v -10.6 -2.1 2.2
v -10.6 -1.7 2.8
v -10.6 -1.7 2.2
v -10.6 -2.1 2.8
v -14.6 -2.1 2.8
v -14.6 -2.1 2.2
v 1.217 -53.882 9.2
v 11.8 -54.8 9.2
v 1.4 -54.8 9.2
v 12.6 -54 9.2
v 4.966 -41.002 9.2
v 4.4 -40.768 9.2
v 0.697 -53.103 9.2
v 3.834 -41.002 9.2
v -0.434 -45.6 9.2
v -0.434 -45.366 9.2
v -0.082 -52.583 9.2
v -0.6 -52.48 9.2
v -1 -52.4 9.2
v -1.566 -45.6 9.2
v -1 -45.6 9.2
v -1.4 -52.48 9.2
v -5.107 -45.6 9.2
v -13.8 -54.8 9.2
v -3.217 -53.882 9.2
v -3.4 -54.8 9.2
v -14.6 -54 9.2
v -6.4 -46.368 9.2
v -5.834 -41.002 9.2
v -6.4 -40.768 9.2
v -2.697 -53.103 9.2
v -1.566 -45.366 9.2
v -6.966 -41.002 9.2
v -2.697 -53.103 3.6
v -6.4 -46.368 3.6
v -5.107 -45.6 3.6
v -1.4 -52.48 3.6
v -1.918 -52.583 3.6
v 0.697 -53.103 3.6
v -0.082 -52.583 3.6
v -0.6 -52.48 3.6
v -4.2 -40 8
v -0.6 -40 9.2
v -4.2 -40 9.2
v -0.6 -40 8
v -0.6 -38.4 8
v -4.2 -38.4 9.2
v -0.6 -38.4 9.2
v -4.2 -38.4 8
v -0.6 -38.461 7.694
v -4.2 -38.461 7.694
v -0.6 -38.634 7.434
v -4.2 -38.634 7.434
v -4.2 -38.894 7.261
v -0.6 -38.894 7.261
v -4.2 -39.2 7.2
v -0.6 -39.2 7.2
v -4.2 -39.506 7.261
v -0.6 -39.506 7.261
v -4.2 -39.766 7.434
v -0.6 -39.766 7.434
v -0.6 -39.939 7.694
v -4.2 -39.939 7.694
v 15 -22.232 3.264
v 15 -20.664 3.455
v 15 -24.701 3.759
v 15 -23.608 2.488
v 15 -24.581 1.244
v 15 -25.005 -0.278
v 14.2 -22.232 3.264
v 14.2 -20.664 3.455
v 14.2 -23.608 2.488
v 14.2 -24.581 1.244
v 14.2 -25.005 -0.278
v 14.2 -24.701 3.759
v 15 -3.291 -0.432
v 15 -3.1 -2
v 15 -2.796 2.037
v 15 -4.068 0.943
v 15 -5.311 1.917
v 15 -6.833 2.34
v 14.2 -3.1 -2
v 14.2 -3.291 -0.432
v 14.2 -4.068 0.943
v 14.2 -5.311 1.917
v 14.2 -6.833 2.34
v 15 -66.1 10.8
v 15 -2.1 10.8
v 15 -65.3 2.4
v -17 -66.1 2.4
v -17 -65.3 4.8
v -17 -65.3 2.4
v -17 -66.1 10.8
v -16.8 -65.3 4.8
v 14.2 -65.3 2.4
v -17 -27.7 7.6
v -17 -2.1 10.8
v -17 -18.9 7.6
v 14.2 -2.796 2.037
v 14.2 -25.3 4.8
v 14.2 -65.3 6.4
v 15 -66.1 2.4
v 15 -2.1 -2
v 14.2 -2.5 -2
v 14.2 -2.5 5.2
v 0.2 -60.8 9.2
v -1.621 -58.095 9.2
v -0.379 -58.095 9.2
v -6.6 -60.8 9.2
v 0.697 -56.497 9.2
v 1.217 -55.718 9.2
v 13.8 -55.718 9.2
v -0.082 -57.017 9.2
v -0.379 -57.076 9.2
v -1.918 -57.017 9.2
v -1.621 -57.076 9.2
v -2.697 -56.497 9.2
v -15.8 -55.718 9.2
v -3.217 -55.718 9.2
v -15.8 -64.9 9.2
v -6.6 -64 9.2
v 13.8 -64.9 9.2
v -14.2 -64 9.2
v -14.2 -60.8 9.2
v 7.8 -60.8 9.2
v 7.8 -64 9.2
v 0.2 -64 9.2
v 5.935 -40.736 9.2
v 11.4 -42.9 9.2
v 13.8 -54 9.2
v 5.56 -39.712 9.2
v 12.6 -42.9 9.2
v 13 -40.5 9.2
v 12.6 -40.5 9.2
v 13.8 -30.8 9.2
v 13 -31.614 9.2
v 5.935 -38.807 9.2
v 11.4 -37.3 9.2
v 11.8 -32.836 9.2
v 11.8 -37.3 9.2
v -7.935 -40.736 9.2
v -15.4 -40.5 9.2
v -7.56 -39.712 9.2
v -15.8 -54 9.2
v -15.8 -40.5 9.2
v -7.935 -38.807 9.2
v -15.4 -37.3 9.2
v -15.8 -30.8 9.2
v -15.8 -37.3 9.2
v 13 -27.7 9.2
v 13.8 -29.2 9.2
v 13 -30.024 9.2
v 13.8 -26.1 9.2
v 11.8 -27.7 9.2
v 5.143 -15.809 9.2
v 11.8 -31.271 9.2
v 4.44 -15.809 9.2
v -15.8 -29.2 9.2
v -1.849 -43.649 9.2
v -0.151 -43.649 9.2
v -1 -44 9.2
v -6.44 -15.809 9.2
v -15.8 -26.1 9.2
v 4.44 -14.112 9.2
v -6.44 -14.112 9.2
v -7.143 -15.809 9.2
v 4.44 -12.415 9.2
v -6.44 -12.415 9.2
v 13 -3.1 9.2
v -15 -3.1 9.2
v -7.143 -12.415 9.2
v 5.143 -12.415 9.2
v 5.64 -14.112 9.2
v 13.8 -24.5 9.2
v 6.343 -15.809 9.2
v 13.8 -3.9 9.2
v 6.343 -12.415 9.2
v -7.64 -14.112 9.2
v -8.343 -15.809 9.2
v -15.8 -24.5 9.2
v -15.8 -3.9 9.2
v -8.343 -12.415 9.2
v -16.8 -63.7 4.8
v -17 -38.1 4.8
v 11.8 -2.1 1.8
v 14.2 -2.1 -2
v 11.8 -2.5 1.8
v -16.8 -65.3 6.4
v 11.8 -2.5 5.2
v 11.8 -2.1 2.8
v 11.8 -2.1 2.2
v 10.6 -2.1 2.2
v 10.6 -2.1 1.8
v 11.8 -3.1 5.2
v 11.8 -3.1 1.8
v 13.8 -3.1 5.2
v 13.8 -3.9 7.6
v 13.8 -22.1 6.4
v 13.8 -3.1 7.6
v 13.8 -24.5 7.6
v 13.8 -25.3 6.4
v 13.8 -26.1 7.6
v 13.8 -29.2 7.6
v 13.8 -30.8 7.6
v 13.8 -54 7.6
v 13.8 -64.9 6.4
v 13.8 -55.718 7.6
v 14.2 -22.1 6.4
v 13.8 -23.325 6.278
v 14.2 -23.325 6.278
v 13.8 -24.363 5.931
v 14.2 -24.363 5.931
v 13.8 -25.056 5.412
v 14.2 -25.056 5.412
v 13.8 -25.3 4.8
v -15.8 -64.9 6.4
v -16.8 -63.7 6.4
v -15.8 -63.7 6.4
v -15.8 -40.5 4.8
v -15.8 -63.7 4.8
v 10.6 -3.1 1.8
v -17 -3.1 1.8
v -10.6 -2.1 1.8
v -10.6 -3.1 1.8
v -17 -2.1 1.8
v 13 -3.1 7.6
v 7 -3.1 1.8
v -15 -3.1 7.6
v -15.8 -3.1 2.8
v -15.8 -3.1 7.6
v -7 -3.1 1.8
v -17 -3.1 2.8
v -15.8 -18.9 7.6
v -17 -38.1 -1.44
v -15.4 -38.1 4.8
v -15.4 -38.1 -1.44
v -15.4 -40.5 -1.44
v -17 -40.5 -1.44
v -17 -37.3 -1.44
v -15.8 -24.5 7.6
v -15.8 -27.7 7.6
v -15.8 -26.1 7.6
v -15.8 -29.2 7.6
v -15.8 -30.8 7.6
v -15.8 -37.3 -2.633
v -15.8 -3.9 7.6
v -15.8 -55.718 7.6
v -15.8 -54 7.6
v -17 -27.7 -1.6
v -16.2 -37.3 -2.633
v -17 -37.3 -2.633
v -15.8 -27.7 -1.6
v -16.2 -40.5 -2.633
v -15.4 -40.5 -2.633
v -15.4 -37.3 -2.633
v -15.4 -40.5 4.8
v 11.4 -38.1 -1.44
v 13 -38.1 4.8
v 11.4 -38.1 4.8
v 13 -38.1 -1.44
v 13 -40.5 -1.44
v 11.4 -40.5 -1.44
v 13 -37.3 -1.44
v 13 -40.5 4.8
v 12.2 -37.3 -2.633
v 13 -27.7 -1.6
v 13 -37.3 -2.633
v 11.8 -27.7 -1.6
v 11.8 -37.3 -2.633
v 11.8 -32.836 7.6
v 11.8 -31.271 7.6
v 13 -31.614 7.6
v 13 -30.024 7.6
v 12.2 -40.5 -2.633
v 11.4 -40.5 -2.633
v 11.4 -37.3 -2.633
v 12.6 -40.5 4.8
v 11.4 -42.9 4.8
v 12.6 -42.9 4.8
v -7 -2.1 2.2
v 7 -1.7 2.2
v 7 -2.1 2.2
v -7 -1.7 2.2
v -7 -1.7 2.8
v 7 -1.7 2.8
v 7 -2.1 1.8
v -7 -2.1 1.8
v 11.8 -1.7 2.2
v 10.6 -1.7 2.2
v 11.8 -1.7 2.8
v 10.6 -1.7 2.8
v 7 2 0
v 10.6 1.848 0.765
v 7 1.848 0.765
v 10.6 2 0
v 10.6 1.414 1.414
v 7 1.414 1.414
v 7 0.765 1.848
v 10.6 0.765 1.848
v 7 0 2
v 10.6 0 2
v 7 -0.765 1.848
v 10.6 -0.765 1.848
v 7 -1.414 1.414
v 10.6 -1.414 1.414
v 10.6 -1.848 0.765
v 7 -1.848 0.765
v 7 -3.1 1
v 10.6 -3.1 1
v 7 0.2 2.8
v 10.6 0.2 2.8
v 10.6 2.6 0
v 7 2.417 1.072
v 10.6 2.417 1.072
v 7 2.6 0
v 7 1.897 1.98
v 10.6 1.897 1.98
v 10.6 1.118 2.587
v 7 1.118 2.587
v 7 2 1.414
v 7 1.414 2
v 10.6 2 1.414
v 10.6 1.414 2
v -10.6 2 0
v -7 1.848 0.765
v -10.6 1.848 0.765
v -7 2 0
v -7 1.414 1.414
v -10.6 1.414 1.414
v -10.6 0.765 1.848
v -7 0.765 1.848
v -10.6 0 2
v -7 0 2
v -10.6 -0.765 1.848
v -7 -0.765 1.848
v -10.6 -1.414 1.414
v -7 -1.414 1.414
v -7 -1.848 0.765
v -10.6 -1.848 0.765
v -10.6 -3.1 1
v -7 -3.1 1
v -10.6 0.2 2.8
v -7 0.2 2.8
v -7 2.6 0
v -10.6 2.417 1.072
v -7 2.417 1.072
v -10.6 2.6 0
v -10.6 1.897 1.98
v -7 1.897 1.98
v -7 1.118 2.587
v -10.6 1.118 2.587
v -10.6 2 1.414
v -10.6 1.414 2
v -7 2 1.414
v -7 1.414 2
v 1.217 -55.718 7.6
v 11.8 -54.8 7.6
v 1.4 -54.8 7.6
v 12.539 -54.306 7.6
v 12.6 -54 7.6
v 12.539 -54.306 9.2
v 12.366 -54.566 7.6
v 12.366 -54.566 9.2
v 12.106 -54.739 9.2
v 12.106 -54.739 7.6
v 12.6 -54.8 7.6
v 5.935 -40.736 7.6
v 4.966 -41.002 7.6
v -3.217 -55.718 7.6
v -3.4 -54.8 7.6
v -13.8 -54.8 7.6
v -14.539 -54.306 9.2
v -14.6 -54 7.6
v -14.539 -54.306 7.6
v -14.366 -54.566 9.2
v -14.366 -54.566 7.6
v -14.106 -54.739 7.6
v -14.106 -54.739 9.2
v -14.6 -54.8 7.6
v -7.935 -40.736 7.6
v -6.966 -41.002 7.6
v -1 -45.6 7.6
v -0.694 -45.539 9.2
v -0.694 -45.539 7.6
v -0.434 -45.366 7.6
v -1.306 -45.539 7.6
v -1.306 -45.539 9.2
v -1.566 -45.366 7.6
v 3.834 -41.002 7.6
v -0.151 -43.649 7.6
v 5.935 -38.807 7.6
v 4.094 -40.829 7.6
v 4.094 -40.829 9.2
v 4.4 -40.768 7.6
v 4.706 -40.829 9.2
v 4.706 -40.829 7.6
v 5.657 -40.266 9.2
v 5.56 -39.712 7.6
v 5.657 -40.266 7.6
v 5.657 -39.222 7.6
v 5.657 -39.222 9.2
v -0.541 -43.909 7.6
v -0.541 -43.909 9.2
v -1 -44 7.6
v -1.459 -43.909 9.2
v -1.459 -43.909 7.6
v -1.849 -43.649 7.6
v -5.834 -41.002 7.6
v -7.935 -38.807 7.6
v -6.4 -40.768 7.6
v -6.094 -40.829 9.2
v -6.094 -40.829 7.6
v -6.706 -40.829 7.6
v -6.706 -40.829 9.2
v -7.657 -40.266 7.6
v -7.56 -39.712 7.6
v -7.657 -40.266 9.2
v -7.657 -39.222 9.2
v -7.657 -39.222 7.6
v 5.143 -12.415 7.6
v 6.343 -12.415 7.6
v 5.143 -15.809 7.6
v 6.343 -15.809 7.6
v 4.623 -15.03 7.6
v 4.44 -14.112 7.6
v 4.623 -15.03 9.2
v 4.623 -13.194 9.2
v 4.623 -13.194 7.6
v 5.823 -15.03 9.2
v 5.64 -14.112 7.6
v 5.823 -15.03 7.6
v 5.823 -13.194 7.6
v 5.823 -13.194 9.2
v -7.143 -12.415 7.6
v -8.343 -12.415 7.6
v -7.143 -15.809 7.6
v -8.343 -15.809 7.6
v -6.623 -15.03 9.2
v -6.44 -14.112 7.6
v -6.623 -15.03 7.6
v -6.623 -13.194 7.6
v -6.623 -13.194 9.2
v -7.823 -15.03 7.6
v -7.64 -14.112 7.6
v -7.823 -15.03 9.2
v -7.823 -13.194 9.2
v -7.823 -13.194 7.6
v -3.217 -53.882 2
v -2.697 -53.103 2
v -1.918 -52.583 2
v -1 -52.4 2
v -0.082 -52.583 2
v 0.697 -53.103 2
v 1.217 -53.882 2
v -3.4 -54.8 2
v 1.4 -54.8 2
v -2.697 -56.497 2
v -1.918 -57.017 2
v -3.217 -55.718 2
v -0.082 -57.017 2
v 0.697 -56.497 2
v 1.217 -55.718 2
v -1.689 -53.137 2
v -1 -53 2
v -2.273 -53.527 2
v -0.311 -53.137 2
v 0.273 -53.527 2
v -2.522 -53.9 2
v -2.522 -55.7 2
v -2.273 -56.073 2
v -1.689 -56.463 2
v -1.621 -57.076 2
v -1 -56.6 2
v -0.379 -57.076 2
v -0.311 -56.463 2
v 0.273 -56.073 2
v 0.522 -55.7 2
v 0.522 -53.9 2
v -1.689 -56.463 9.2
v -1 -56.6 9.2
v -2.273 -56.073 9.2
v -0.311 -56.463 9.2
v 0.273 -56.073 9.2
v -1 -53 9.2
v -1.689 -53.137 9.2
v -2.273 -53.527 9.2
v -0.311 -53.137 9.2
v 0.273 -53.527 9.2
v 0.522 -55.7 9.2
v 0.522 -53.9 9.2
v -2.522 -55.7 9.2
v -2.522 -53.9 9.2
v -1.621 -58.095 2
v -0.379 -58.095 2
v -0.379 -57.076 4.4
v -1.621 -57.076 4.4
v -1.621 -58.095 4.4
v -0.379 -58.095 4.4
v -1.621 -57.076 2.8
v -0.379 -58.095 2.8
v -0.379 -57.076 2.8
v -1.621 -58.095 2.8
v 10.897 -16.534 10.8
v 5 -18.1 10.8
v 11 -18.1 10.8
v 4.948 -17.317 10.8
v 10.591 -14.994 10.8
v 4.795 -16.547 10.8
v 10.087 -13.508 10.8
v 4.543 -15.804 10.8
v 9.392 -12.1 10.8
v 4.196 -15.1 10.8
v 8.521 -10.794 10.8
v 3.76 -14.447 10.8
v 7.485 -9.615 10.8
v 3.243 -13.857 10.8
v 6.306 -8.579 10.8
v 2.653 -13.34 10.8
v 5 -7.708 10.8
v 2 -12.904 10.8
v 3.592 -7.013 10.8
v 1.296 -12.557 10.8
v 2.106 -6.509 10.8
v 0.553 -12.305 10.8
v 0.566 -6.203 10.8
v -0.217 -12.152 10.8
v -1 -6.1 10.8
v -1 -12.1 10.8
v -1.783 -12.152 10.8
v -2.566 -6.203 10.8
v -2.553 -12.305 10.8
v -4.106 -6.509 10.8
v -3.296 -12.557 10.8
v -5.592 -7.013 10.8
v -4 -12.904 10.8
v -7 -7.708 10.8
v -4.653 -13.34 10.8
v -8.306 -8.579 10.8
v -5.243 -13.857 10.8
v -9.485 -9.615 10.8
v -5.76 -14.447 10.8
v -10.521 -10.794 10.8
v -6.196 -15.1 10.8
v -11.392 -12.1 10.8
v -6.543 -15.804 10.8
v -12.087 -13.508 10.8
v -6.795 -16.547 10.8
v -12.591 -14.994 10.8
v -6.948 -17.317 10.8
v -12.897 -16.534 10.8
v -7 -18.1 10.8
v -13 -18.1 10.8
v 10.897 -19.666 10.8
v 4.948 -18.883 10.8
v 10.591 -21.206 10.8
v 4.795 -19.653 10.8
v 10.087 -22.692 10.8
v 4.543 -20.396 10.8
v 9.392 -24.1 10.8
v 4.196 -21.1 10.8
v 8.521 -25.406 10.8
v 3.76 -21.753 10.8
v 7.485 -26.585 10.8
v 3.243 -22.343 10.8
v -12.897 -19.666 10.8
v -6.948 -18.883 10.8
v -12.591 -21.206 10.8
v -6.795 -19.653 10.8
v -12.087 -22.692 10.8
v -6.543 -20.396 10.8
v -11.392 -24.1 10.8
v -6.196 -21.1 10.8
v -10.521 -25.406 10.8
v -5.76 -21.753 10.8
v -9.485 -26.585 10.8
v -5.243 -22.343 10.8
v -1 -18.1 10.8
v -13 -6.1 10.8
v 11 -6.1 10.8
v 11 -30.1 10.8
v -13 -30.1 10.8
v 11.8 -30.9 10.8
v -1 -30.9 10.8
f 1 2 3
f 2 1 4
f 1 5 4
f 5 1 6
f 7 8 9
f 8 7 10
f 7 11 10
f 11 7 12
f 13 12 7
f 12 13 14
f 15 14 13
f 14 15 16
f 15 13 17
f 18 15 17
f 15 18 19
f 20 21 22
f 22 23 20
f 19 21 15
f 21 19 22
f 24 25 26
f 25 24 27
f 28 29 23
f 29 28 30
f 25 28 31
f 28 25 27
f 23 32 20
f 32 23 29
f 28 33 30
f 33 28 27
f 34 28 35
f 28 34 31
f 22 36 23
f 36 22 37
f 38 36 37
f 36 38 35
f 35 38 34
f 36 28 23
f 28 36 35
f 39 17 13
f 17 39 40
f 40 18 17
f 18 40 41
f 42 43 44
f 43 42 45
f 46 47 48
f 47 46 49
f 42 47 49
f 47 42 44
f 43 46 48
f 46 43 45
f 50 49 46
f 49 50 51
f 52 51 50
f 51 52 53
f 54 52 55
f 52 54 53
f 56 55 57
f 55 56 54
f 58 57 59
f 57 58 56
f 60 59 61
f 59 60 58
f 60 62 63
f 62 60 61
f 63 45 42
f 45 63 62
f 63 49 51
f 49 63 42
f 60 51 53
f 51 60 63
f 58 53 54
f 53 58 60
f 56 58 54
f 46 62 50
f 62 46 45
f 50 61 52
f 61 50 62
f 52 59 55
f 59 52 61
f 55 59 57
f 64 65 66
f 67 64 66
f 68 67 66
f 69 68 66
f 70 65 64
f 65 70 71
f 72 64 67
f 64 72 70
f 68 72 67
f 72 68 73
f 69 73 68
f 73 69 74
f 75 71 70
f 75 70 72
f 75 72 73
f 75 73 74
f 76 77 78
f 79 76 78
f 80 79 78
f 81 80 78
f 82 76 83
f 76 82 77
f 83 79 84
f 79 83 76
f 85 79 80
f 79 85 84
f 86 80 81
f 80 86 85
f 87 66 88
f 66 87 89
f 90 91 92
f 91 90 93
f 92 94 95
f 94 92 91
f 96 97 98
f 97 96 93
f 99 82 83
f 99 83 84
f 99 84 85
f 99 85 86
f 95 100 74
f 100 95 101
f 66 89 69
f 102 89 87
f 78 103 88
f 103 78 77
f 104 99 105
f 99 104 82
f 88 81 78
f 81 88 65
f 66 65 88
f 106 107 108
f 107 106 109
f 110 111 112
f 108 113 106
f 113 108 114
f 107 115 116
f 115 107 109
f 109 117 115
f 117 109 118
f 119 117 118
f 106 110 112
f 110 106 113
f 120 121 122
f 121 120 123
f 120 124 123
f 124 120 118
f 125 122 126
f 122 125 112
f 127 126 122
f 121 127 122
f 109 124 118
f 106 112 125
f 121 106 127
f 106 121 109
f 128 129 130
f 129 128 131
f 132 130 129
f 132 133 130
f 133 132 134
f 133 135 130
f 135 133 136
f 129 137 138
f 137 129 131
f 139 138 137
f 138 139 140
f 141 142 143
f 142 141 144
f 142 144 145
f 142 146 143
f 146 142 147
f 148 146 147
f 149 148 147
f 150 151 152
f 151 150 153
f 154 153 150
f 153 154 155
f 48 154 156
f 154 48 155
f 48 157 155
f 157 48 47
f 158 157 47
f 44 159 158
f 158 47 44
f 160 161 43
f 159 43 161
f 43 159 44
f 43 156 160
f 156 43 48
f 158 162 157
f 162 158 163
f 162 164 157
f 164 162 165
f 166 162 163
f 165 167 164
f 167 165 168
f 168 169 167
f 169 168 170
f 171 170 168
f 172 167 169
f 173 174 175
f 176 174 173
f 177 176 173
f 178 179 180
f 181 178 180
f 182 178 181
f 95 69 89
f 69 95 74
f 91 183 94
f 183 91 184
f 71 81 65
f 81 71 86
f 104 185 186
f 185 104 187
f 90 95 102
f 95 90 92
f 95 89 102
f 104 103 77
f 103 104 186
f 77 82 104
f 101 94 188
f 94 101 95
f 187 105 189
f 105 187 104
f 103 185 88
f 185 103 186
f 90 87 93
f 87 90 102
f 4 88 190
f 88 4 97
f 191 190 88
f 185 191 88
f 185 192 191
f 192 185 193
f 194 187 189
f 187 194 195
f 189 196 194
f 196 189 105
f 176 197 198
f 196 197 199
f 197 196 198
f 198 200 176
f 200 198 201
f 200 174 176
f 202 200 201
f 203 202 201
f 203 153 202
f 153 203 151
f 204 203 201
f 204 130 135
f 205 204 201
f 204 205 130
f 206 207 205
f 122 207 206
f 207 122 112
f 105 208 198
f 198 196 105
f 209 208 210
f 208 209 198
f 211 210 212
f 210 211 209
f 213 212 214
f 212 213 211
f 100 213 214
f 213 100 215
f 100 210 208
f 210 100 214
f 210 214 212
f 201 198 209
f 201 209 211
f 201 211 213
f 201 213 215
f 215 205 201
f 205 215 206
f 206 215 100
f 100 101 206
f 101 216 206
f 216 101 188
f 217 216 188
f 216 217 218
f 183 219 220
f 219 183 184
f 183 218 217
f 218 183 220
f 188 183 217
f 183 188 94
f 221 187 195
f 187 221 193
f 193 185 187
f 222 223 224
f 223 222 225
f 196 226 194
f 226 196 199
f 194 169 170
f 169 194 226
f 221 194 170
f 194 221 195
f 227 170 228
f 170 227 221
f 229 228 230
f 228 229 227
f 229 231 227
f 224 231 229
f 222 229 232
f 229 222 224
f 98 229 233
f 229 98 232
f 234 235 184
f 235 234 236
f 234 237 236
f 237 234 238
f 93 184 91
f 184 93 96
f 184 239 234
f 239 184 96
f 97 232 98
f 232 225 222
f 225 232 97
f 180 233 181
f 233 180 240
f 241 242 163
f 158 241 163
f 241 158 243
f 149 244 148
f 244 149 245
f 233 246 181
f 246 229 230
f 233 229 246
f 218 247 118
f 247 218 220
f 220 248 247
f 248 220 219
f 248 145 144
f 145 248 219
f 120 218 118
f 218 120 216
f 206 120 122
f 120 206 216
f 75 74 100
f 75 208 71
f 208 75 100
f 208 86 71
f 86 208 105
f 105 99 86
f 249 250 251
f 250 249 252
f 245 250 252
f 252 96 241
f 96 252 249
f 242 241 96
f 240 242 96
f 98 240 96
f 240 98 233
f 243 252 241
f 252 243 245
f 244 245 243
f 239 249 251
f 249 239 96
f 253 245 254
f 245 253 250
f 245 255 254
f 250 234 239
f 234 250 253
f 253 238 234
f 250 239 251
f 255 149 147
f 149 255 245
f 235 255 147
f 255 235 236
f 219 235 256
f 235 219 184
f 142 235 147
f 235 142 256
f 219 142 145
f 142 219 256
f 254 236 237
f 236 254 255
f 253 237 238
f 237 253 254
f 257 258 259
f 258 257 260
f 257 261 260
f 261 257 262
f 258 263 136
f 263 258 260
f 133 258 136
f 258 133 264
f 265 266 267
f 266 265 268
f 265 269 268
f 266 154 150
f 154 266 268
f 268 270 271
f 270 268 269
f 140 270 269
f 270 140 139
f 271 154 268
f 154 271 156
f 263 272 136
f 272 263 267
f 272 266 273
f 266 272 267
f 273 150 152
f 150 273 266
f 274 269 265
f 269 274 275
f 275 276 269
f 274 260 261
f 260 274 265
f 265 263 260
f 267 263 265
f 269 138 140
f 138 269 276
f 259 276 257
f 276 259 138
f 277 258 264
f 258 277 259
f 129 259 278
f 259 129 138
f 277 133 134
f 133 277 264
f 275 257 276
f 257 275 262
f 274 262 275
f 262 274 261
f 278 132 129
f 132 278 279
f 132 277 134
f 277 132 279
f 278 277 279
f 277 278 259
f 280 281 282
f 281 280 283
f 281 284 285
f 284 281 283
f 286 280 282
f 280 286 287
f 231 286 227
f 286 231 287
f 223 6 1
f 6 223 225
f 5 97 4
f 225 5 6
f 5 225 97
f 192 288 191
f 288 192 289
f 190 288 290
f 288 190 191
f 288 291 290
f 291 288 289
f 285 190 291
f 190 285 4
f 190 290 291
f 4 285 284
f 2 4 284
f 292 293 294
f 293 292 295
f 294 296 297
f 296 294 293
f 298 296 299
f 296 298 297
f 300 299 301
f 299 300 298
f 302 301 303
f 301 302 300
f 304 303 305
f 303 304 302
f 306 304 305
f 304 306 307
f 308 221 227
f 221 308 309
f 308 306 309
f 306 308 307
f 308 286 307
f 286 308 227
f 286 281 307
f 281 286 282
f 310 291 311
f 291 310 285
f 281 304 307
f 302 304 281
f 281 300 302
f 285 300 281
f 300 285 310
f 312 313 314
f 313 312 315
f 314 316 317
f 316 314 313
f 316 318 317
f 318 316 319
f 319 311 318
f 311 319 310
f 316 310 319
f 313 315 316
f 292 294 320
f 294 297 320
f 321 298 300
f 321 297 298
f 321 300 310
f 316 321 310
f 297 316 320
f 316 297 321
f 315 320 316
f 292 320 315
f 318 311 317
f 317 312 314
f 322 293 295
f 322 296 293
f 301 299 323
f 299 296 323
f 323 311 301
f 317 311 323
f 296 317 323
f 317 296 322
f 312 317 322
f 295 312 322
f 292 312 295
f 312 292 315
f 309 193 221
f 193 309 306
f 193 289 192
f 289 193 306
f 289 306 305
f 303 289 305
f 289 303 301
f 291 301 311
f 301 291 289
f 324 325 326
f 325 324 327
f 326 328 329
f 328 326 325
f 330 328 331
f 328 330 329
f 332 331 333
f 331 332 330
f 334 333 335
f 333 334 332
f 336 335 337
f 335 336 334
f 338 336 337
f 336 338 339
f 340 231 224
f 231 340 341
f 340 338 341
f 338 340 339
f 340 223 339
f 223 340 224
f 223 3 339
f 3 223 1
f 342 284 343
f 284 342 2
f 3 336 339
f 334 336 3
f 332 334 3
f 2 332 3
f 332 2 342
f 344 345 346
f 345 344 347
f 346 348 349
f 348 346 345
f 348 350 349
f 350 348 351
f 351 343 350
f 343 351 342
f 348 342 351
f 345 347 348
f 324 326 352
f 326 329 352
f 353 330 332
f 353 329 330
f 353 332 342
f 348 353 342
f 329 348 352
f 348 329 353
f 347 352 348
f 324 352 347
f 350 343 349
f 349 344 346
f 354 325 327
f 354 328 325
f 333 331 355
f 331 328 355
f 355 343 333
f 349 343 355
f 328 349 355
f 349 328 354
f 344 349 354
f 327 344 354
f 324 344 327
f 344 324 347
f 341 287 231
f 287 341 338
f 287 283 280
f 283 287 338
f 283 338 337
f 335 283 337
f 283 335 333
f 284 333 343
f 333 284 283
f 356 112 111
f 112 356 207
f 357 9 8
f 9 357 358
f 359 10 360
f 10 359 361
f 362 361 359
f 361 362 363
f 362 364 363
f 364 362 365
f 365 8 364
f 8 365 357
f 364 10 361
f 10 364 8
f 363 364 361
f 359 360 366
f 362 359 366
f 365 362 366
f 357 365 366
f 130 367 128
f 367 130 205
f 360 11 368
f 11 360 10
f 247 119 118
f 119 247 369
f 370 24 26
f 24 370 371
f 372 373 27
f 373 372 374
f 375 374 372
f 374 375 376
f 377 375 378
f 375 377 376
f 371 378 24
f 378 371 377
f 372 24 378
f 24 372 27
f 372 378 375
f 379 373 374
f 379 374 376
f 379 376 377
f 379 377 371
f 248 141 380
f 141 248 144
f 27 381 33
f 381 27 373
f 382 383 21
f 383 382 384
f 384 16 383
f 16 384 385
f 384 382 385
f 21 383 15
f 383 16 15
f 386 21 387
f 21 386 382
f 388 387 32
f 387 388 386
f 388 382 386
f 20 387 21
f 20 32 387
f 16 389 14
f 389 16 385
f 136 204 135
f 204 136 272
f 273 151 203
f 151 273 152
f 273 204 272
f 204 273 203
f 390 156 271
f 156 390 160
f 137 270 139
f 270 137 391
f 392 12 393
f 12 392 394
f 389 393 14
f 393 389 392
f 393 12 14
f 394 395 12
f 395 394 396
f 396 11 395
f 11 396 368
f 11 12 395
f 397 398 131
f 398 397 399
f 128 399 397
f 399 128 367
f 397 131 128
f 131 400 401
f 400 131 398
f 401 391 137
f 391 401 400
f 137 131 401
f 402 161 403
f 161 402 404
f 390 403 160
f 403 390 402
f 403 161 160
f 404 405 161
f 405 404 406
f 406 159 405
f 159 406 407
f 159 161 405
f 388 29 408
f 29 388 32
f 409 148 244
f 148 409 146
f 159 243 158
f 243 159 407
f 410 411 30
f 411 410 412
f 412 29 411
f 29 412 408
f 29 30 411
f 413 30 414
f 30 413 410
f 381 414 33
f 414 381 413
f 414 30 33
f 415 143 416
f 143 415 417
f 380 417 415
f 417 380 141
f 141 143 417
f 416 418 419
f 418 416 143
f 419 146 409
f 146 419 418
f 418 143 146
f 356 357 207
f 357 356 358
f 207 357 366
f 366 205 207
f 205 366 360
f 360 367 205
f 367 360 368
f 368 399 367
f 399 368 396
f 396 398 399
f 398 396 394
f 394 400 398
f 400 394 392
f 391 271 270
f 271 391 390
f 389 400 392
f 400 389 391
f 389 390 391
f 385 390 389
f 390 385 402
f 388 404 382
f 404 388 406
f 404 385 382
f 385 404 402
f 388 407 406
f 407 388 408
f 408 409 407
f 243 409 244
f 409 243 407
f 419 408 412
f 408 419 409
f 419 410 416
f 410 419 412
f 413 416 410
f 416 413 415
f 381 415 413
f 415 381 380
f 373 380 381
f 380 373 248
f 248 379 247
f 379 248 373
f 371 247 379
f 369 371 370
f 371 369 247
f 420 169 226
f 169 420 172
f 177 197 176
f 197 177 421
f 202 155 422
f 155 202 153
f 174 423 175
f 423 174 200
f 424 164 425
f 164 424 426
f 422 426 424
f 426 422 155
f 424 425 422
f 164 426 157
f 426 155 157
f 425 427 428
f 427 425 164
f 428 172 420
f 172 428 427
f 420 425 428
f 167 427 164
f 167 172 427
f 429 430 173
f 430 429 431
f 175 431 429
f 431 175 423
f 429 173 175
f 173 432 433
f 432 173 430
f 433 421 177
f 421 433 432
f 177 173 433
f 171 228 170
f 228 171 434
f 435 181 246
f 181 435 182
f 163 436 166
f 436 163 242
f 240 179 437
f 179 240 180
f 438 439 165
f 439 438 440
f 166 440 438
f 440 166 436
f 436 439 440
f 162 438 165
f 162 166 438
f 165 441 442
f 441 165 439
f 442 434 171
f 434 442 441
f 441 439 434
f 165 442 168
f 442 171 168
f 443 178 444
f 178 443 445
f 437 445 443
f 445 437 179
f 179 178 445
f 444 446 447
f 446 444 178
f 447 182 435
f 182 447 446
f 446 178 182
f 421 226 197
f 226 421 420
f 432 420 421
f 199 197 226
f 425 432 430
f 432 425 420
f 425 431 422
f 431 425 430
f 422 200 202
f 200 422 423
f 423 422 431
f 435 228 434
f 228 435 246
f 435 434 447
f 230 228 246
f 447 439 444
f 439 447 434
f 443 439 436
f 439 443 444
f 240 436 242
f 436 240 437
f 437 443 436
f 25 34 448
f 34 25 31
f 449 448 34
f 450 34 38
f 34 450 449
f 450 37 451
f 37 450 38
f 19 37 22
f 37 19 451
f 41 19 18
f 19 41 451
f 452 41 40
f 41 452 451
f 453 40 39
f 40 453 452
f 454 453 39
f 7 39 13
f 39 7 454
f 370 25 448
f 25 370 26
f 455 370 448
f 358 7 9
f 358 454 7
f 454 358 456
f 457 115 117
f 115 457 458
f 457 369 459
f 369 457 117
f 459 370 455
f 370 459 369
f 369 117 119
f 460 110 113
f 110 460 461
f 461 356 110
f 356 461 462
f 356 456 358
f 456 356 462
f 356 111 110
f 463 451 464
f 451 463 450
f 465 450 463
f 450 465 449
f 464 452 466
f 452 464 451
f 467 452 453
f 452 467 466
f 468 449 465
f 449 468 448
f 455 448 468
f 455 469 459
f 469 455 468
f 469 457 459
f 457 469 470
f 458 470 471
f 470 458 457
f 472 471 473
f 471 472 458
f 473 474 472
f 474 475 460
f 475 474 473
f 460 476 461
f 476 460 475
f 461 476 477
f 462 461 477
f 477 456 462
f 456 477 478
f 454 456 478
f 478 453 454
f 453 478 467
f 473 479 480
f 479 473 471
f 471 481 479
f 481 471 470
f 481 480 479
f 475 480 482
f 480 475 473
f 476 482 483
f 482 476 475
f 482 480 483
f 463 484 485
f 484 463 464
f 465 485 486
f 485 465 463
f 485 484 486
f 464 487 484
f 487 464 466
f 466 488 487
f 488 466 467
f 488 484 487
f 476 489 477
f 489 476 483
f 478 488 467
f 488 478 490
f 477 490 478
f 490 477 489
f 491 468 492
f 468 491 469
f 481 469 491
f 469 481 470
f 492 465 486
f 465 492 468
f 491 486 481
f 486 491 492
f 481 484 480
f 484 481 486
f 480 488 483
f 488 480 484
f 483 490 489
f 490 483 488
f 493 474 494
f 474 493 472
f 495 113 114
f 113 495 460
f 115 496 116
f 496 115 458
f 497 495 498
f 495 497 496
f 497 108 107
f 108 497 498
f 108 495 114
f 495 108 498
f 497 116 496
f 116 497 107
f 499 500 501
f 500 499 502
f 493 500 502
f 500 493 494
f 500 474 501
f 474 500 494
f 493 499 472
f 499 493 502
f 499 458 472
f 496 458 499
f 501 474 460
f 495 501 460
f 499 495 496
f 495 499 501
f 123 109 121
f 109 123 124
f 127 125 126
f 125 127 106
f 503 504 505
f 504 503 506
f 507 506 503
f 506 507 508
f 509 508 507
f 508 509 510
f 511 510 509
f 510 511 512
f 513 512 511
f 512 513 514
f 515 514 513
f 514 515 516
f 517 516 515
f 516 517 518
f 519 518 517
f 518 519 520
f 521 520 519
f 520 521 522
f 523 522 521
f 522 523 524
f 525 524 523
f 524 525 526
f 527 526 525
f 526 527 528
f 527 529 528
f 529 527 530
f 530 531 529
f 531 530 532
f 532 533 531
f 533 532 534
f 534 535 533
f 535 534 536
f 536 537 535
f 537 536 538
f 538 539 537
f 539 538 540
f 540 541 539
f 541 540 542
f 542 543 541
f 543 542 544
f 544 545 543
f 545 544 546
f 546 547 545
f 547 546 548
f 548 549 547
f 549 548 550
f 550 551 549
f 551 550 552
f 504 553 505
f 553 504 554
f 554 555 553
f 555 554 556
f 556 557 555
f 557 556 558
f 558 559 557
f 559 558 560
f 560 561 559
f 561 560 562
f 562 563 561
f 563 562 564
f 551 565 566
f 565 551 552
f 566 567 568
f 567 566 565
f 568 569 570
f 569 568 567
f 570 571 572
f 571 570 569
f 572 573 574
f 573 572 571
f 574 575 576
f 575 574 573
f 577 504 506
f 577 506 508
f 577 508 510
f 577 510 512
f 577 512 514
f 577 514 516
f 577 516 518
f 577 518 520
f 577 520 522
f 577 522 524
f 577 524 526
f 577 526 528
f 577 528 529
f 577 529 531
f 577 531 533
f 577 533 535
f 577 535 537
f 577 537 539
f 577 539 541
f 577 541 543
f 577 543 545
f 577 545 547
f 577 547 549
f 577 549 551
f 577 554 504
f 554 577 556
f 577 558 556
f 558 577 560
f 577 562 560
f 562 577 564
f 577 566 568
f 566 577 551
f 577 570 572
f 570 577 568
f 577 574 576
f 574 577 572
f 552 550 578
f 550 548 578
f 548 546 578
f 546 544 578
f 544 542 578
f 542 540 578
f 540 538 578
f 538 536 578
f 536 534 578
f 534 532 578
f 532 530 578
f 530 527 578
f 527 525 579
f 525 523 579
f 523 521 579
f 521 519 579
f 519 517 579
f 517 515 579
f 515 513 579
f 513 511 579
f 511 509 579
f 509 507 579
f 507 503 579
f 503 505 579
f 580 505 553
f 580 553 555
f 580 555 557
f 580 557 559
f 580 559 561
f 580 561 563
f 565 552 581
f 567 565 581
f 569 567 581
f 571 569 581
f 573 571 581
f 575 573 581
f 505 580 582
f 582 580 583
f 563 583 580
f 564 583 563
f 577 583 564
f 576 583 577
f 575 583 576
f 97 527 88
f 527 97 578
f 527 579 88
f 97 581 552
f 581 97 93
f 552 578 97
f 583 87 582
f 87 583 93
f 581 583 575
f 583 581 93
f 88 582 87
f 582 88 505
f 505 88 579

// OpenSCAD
use <../lib.scad>
use <s/4111s01.scad>
use <s/4112p05s01.scad>
use <s/4112s01.scad>
function ldraw_lib__4111p05() = [
// 0 ~Electric Switch: Key Right with Right Rotating Arrow Pattern
// 0 Name: 4111p05.dat
// 0 Author: Javier Orquera [kuramapika1]
// 0 !LDRAW_ORG Part UPDATE 2025-09
// 0 !LICENSE Licensed under CC BY 4.0 : see CAreadme.txt
// 
// 0 !HELP to put this part into a pressed-down state, rotate it 4.3 degrees
// 0 !HELP around the x-axis
// 
// 0 BFC CERTIFY CCW
  [0,"BFC","CERTIFY"],
  [0,"BFC","CCW"],
// 
// 0 !KEYWORDS control, dacta, set 1039, set 1342, Technic
// 
// 0 !HISTORY 2025-04-24 [kuramapika1] Adapted surfaces
// 0 !HISTORY 2025-09-29 [OrionP] Official Update 2025-09
// 
// 1 16 0 0 0 1 0 0 0 1 0 0 0 1 s\4111s01.dat
  [1,16,0,0,0,1,0,0,0,1,0,0,0,1, ldraw_lib__s__4111s01()],
// 1 16 0 0 0 -1 0 0 0 1 0 0 0 1 s\4112s01.dat
  [1,16,0,0,0,-1,0,0,0,1,0,0,0,1, ldraw_lib__s__4112s01()],
// 1 16 -2.5 -5 0 -1 0 0 0 1 0 0 0 1 s\4112p05s01.dat
  [1,16,-2.5,-5,0,-1,0,0,0,1,0,0,0,1, ldraw_lib__s__4112p05s01()],
];
module ldraw_lib__4111p05(step=0, col=false, unit=2/5, alt=false, line=0.2, solid=!$preview)
    makepoly(ldraw_lib__4111p05(), step=step, col=col, unit=unit, alt=alt, line=line, solid=solid);
ldraw_lib__4111p05(line=0.2);
